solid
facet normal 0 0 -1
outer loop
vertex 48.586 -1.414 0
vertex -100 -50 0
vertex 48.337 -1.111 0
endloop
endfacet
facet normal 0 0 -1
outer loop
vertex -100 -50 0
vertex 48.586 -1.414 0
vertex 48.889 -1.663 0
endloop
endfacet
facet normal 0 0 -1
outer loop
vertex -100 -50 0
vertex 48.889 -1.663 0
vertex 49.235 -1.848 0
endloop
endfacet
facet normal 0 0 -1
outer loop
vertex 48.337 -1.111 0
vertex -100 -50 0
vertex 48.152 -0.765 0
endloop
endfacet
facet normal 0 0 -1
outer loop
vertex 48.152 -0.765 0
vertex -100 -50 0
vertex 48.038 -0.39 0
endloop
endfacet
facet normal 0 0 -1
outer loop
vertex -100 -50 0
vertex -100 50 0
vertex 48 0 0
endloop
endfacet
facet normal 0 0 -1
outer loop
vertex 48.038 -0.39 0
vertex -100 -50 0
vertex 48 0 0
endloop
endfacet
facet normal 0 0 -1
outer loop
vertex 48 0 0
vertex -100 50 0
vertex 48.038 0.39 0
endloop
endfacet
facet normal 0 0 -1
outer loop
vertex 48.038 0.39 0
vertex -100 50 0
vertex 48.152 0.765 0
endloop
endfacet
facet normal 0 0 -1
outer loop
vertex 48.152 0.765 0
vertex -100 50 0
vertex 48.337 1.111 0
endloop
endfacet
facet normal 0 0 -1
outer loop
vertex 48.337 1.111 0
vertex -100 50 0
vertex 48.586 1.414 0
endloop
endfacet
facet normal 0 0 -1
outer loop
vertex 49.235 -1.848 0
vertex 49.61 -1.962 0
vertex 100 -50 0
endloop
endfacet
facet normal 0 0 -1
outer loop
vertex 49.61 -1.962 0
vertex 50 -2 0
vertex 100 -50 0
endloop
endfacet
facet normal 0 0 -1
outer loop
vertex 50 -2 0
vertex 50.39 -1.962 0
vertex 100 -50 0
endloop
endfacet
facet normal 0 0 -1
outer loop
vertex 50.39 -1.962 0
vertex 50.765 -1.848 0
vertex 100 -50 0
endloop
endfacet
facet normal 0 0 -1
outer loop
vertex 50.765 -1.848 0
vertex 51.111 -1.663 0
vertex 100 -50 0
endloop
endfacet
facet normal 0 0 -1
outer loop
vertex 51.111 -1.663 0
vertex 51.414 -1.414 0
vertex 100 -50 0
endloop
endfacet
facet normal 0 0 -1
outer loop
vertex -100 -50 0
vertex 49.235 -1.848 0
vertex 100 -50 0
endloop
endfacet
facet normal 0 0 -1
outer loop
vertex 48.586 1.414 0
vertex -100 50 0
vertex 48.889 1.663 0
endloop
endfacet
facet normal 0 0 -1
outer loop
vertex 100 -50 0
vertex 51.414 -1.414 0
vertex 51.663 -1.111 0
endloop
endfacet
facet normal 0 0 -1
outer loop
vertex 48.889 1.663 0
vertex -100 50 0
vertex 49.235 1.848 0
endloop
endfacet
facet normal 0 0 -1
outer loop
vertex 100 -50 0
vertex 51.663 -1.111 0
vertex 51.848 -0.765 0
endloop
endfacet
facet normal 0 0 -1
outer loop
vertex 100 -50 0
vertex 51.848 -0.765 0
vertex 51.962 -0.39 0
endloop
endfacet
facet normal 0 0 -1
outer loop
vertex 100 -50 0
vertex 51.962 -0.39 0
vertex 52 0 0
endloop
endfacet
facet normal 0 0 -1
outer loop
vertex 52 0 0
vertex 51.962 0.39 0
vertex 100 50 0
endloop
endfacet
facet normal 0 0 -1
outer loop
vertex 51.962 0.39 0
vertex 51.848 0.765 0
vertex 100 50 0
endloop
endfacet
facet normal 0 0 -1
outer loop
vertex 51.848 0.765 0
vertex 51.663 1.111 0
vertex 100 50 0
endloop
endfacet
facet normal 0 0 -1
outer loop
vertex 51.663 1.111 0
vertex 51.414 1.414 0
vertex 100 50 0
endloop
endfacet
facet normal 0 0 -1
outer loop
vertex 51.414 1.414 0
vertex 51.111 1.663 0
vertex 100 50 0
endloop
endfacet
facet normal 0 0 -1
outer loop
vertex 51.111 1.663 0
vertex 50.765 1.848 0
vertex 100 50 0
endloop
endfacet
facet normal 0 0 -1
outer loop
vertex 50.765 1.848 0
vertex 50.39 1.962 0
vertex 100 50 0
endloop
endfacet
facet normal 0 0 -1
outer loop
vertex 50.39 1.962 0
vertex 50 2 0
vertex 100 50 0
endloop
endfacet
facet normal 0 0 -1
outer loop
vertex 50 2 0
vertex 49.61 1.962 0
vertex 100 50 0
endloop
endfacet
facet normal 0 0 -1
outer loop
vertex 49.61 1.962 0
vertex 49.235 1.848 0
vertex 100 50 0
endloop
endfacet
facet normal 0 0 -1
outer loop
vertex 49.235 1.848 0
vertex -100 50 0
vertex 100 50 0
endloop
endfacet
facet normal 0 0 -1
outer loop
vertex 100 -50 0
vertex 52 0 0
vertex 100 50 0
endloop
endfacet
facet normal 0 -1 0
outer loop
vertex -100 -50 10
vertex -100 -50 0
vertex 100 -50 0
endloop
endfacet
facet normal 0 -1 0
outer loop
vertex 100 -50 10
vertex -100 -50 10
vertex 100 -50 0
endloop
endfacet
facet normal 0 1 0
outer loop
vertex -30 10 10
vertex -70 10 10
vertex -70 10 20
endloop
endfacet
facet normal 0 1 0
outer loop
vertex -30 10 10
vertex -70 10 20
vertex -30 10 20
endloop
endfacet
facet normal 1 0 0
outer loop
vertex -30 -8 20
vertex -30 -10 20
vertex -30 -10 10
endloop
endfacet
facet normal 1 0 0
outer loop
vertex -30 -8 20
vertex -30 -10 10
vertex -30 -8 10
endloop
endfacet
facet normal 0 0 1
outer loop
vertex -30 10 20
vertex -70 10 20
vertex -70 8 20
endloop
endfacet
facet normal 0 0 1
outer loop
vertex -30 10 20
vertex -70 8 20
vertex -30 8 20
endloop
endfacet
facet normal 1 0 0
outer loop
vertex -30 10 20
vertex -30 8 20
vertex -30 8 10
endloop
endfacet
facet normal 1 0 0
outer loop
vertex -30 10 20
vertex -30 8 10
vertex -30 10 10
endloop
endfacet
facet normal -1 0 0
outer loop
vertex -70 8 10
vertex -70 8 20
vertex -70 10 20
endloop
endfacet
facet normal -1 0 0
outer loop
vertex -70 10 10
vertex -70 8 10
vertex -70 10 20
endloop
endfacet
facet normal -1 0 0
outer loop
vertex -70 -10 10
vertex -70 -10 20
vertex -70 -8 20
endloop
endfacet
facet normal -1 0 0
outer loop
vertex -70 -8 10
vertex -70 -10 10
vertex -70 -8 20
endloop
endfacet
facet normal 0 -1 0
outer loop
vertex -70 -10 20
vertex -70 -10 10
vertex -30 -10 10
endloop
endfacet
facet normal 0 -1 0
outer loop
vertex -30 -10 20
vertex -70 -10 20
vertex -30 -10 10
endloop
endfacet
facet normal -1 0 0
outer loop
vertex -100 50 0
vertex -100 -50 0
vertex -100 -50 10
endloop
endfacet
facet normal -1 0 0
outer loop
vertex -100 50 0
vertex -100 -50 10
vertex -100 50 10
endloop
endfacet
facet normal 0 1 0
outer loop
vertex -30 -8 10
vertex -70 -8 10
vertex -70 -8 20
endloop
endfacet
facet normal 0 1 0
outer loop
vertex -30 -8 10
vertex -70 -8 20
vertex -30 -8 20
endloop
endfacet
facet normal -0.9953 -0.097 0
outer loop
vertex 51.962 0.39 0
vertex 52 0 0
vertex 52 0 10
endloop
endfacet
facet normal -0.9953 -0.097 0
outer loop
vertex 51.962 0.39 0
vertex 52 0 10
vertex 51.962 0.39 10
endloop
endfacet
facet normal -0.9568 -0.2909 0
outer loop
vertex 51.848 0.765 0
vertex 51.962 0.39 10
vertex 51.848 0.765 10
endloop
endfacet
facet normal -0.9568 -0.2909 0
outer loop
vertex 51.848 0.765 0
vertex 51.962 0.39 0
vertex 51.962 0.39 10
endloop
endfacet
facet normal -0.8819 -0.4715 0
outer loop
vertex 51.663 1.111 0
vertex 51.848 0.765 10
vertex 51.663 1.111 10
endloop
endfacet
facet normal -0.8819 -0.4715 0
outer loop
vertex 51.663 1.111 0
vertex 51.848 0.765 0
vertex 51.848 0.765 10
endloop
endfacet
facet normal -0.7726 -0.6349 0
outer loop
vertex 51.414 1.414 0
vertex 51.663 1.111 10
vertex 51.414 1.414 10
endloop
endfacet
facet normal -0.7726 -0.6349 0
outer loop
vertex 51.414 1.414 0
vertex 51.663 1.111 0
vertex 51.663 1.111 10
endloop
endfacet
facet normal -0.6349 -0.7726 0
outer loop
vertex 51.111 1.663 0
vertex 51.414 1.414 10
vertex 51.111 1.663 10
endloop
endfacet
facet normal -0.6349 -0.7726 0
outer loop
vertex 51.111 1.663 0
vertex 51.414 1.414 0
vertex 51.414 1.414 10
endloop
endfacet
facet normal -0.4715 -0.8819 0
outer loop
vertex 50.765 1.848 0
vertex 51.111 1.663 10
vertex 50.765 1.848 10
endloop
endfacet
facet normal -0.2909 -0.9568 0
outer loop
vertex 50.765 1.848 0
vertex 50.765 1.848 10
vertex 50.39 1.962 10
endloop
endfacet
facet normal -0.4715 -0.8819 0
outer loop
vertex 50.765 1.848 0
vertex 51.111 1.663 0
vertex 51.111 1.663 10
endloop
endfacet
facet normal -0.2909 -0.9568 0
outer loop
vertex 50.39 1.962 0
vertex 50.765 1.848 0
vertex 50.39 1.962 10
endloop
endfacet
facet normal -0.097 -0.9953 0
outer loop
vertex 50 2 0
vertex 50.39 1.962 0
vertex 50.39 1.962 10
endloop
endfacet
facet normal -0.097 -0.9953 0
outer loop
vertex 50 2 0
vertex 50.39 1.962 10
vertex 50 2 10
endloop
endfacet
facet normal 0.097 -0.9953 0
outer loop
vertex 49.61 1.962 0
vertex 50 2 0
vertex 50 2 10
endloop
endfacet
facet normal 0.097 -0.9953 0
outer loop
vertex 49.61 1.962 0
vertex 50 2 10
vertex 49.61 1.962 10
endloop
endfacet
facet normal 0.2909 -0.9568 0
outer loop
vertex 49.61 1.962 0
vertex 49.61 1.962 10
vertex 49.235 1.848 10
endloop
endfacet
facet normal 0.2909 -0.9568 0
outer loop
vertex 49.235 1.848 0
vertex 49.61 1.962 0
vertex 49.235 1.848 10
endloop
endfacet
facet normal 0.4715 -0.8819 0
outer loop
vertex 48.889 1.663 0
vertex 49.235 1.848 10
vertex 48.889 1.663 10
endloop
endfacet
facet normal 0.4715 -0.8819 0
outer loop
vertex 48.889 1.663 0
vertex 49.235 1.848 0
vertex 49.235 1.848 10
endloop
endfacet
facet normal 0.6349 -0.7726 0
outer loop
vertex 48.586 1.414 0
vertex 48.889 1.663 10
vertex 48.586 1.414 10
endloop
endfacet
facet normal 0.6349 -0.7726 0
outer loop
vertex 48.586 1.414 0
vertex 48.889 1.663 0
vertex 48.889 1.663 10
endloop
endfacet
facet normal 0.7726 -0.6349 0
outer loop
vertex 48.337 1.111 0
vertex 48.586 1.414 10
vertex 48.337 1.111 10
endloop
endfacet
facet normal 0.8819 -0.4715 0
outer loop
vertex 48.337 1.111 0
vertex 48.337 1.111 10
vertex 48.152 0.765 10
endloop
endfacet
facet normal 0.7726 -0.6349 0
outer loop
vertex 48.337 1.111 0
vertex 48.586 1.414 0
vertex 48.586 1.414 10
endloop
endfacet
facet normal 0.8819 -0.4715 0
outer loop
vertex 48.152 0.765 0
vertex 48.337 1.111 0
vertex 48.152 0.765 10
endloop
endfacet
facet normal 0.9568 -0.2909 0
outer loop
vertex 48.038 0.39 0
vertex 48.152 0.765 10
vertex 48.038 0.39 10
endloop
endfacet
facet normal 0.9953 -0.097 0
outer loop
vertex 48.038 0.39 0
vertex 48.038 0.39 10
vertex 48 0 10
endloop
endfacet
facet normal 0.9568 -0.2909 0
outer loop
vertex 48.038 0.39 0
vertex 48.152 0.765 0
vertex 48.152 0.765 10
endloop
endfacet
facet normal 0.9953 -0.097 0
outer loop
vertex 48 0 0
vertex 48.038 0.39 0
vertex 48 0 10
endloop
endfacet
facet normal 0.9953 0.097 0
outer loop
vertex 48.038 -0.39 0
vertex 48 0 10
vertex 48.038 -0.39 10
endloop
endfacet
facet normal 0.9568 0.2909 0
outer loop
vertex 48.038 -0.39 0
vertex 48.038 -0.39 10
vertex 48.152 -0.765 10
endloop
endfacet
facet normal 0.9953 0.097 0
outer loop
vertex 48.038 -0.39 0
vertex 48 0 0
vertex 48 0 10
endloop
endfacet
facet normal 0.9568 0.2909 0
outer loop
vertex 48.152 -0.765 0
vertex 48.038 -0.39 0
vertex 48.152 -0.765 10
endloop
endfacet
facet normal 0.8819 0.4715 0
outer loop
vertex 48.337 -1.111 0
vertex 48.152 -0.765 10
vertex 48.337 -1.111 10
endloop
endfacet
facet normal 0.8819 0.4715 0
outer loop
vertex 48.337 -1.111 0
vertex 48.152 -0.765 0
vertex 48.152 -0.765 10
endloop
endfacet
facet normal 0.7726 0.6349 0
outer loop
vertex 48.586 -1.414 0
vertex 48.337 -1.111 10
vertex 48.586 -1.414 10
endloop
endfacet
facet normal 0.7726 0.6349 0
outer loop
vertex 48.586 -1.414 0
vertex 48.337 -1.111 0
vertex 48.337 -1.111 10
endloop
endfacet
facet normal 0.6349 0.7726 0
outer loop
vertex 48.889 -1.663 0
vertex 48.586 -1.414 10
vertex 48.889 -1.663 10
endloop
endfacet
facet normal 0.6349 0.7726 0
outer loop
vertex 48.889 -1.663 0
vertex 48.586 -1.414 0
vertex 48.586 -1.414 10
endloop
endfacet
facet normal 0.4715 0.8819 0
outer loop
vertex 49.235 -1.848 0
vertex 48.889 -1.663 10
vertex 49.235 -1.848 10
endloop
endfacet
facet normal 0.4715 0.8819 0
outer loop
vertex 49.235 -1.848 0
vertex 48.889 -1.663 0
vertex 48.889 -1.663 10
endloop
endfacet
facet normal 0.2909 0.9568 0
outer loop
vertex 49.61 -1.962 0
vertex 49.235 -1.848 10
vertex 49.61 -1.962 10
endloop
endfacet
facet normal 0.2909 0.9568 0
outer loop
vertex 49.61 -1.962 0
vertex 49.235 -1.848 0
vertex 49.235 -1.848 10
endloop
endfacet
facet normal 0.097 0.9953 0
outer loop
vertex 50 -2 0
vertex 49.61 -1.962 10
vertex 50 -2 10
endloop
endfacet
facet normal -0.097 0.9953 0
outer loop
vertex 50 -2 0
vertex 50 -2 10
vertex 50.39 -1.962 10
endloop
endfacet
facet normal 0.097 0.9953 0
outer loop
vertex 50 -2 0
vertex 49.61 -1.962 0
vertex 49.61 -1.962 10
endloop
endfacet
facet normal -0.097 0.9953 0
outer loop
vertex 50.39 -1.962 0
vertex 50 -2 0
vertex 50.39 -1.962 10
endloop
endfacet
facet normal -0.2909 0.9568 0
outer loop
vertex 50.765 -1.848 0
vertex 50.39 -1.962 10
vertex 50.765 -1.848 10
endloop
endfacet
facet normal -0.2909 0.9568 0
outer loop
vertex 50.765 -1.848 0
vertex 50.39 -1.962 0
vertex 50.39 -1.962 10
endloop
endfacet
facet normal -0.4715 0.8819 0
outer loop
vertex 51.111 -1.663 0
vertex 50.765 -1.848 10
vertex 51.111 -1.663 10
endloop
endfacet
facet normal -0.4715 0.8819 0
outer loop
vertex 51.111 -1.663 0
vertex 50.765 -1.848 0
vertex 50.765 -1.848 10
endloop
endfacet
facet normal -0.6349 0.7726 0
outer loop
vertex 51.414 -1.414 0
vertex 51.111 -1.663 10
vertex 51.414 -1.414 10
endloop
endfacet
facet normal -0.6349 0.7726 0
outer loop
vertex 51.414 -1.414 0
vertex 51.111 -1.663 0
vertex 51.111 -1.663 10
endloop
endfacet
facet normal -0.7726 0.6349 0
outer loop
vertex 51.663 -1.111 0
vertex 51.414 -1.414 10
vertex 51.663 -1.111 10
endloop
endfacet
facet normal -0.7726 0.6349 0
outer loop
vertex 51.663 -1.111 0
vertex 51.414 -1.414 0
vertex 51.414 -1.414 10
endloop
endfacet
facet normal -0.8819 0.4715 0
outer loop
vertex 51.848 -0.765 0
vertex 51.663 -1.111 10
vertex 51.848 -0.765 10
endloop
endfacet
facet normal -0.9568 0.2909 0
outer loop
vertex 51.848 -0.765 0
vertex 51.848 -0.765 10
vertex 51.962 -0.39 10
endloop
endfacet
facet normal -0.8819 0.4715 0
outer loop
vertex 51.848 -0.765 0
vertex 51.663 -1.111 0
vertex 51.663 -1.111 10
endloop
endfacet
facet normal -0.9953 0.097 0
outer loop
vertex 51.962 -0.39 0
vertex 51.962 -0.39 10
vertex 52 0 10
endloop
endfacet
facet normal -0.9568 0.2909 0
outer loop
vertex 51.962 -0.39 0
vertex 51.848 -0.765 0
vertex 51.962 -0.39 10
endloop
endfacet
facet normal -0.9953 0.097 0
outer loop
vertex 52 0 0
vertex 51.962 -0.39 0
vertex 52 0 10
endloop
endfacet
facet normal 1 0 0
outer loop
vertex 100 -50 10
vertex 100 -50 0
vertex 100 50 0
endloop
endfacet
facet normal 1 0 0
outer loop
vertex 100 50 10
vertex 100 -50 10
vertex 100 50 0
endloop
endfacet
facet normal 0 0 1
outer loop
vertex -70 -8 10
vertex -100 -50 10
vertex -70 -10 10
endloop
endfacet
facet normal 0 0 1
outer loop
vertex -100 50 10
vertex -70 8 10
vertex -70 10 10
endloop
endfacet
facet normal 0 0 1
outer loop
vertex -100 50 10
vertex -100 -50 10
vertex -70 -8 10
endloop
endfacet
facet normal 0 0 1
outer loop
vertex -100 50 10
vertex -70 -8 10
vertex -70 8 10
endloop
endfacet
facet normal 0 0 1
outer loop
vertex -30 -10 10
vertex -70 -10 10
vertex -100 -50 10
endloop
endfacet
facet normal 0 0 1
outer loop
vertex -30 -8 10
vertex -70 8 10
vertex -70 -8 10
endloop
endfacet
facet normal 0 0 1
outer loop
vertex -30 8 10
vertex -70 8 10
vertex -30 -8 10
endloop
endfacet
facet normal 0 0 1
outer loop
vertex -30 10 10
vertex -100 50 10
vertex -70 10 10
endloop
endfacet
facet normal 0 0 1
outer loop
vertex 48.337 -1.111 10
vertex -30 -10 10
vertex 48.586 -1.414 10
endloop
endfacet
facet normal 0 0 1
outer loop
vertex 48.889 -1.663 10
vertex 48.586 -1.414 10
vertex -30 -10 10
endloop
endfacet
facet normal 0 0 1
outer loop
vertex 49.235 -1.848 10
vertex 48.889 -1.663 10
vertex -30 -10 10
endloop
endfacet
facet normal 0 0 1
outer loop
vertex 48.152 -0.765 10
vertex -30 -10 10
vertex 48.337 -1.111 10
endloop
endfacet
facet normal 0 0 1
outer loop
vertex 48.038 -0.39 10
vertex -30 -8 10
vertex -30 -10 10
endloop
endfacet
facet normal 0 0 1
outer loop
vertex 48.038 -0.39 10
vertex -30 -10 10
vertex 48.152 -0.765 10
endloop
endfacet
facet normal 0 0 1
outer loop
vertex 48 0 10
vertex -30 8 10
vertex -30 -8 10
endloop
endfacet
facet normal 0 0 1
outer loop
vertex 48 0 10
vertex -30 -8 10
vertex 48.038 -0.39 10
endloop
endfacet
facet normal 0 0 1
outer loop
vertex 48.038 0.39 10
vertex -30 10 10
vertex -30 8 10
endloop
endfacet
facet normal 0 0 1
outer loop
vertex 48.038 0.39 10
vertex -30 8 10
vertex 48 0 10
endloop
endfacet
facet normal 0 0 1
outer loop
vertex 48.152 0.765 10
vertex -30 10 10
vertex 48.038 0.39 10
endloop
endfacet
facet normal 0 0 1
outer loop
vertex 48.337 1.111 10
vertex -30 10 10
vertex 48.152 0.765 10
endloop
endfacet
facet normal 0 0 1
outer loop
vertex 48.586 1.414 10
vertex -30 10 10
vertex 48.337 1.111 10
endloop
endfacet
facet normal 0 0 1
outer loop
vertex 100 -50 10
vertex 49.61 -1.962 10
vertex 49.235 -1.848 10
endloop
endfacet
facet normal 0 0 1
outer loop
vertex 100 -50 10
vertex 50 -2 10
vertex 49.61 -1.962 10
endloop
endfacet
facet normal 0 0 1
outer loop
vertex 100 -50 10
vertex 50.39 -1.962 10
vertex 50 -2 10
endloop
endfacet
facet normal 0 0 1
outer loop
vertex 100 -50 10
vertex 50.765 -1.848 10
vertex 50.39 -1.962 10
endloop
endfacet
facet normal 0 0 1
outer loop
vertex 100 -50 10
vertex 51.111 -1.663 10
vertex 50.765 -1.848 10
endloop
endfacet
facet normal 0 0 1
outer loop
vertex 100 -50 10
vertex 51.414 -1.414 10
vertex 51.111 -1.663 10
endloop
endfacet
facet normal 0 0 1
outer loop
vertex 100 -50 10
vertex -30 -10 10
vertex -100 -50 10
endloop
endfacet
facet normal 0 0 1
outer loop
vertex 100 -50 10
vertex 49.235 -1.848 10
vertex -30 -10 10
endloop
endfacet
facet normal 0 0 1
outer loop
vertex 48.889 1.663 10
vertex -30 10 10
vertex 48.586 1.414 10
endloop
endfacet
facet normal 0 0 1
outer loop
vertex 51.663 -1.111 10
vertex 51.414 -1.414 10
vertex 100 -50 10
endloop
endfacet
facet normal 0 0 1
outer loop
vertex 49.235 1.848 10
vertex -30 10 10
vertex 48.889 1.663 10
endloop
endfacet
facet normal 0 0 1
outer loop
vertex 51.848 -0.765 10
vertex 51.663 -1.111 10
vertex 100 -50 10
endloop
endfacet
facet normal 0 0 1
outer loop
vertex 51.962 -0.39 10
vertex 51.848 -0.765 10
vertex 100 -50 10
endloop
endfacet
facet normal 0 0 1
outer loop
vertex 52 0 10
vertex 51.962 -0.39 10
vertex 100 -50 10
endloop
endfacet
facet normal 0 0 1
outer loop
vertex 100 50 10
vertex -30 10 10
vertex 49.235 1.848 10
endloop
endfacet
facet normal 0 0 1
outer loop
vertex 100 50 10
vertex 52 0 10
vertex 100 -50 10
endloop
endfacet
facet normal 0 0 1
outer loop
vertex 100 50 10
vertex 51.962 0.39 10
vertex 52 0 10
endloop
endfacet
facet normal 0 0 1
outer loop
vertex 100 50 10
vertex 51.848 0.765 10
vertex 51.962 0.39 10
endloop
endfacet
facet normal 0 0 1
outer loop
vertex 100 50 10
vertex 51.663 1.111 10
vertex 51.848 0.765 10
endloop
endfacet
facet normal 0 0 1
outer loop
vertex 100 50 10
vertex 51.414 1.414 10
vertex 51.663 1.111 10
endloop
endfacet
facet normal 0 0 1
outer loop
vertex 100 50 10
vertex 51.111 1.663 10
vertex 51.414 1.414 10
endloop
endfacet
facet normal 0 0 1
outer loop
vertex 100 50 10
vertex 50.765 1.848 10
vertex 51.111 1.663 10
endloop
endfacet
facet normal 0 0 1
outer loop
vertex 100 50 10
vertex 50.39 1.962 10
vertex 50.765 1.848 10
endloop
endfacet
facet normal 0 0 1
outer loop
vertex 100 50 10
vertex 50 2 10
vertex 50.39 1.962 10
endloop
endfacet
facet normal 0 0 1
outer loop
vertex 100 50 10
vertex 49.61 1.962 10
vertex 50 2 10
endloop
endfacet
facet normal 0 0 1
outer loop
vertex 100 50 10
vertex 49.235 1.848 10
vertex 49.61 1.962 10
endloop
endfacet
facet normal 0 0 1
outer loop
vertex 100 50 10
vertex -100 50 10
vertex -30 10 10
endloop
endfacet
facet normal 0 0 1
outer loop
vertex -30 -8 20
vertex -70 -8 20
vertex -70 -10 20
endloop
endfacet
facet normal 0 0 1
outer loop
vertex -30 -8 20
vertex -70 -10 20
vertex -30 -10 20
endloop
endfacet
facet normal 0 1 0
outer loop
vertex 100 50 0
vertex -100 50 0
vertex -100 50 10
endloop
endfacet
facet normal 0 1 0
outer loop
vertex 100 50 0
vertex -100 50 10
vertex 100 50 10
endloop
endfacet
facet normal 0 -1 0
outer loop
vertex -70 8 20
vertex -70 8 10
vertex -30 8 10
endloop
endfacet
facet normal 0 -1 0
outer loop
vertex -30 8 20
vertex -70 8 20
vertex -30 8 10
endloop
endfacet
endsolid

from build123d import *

# Parameters (mm, degrees)
SKETCH1_W           = 40
SKETCH1_H           = 2
BOSS_EXTRUDE2_DEPTH = 10
SKETCH1_4_W         = 40
SKETCH1_4_H         = 2
BOSS_EXTRUDE3_DEPTH = 20


with BuildPart() as part:
    # Sketch1 → Boss-Extrude2 (new body)
    with BuildSketch(Plane.XY):
        Polygon((-100, -50), (50, -50), (100, -50), (100, 50), (-100, 50), align=None)
        Polygon((-70, -10), (-70, -8), (-30, -8), (-30, -10), (-40, -10), (-60, -10), align=None, mode=Mode.SUBTRACT)
        with Locations((-50, 9)):
            Rectangle(SKETCH1_W, SKETCH1_H, mode=Mode.SUBTRACT)
        with BuildLine():
            ThreePointArc((52, 0), (51.414213562, -1.414213562), (50, -2))
            ThreePointArc((50, -2), (48.585786438, 1.414213562), (52, 0))
        make_face(mode=Mode.SUBTRACT)
    extrude(amount=BOSS_EXTRUDE2_DEPTH)

    # Sketch1_4 → Boss-Extrude3 (add)
    with BuildSketch(Plane.XY):
        with Locations((-50, 9)):
            Rectangle(SKETCH1_4_W, SKETCH1_4_H)
        with Locations((-50, -9)):
            Rectangle(SKETCH1_4_W, SKETCH1_4_H)
    extrude(amount=BOSS_EXTRUDE3_DEPTH)


solid = part.part
